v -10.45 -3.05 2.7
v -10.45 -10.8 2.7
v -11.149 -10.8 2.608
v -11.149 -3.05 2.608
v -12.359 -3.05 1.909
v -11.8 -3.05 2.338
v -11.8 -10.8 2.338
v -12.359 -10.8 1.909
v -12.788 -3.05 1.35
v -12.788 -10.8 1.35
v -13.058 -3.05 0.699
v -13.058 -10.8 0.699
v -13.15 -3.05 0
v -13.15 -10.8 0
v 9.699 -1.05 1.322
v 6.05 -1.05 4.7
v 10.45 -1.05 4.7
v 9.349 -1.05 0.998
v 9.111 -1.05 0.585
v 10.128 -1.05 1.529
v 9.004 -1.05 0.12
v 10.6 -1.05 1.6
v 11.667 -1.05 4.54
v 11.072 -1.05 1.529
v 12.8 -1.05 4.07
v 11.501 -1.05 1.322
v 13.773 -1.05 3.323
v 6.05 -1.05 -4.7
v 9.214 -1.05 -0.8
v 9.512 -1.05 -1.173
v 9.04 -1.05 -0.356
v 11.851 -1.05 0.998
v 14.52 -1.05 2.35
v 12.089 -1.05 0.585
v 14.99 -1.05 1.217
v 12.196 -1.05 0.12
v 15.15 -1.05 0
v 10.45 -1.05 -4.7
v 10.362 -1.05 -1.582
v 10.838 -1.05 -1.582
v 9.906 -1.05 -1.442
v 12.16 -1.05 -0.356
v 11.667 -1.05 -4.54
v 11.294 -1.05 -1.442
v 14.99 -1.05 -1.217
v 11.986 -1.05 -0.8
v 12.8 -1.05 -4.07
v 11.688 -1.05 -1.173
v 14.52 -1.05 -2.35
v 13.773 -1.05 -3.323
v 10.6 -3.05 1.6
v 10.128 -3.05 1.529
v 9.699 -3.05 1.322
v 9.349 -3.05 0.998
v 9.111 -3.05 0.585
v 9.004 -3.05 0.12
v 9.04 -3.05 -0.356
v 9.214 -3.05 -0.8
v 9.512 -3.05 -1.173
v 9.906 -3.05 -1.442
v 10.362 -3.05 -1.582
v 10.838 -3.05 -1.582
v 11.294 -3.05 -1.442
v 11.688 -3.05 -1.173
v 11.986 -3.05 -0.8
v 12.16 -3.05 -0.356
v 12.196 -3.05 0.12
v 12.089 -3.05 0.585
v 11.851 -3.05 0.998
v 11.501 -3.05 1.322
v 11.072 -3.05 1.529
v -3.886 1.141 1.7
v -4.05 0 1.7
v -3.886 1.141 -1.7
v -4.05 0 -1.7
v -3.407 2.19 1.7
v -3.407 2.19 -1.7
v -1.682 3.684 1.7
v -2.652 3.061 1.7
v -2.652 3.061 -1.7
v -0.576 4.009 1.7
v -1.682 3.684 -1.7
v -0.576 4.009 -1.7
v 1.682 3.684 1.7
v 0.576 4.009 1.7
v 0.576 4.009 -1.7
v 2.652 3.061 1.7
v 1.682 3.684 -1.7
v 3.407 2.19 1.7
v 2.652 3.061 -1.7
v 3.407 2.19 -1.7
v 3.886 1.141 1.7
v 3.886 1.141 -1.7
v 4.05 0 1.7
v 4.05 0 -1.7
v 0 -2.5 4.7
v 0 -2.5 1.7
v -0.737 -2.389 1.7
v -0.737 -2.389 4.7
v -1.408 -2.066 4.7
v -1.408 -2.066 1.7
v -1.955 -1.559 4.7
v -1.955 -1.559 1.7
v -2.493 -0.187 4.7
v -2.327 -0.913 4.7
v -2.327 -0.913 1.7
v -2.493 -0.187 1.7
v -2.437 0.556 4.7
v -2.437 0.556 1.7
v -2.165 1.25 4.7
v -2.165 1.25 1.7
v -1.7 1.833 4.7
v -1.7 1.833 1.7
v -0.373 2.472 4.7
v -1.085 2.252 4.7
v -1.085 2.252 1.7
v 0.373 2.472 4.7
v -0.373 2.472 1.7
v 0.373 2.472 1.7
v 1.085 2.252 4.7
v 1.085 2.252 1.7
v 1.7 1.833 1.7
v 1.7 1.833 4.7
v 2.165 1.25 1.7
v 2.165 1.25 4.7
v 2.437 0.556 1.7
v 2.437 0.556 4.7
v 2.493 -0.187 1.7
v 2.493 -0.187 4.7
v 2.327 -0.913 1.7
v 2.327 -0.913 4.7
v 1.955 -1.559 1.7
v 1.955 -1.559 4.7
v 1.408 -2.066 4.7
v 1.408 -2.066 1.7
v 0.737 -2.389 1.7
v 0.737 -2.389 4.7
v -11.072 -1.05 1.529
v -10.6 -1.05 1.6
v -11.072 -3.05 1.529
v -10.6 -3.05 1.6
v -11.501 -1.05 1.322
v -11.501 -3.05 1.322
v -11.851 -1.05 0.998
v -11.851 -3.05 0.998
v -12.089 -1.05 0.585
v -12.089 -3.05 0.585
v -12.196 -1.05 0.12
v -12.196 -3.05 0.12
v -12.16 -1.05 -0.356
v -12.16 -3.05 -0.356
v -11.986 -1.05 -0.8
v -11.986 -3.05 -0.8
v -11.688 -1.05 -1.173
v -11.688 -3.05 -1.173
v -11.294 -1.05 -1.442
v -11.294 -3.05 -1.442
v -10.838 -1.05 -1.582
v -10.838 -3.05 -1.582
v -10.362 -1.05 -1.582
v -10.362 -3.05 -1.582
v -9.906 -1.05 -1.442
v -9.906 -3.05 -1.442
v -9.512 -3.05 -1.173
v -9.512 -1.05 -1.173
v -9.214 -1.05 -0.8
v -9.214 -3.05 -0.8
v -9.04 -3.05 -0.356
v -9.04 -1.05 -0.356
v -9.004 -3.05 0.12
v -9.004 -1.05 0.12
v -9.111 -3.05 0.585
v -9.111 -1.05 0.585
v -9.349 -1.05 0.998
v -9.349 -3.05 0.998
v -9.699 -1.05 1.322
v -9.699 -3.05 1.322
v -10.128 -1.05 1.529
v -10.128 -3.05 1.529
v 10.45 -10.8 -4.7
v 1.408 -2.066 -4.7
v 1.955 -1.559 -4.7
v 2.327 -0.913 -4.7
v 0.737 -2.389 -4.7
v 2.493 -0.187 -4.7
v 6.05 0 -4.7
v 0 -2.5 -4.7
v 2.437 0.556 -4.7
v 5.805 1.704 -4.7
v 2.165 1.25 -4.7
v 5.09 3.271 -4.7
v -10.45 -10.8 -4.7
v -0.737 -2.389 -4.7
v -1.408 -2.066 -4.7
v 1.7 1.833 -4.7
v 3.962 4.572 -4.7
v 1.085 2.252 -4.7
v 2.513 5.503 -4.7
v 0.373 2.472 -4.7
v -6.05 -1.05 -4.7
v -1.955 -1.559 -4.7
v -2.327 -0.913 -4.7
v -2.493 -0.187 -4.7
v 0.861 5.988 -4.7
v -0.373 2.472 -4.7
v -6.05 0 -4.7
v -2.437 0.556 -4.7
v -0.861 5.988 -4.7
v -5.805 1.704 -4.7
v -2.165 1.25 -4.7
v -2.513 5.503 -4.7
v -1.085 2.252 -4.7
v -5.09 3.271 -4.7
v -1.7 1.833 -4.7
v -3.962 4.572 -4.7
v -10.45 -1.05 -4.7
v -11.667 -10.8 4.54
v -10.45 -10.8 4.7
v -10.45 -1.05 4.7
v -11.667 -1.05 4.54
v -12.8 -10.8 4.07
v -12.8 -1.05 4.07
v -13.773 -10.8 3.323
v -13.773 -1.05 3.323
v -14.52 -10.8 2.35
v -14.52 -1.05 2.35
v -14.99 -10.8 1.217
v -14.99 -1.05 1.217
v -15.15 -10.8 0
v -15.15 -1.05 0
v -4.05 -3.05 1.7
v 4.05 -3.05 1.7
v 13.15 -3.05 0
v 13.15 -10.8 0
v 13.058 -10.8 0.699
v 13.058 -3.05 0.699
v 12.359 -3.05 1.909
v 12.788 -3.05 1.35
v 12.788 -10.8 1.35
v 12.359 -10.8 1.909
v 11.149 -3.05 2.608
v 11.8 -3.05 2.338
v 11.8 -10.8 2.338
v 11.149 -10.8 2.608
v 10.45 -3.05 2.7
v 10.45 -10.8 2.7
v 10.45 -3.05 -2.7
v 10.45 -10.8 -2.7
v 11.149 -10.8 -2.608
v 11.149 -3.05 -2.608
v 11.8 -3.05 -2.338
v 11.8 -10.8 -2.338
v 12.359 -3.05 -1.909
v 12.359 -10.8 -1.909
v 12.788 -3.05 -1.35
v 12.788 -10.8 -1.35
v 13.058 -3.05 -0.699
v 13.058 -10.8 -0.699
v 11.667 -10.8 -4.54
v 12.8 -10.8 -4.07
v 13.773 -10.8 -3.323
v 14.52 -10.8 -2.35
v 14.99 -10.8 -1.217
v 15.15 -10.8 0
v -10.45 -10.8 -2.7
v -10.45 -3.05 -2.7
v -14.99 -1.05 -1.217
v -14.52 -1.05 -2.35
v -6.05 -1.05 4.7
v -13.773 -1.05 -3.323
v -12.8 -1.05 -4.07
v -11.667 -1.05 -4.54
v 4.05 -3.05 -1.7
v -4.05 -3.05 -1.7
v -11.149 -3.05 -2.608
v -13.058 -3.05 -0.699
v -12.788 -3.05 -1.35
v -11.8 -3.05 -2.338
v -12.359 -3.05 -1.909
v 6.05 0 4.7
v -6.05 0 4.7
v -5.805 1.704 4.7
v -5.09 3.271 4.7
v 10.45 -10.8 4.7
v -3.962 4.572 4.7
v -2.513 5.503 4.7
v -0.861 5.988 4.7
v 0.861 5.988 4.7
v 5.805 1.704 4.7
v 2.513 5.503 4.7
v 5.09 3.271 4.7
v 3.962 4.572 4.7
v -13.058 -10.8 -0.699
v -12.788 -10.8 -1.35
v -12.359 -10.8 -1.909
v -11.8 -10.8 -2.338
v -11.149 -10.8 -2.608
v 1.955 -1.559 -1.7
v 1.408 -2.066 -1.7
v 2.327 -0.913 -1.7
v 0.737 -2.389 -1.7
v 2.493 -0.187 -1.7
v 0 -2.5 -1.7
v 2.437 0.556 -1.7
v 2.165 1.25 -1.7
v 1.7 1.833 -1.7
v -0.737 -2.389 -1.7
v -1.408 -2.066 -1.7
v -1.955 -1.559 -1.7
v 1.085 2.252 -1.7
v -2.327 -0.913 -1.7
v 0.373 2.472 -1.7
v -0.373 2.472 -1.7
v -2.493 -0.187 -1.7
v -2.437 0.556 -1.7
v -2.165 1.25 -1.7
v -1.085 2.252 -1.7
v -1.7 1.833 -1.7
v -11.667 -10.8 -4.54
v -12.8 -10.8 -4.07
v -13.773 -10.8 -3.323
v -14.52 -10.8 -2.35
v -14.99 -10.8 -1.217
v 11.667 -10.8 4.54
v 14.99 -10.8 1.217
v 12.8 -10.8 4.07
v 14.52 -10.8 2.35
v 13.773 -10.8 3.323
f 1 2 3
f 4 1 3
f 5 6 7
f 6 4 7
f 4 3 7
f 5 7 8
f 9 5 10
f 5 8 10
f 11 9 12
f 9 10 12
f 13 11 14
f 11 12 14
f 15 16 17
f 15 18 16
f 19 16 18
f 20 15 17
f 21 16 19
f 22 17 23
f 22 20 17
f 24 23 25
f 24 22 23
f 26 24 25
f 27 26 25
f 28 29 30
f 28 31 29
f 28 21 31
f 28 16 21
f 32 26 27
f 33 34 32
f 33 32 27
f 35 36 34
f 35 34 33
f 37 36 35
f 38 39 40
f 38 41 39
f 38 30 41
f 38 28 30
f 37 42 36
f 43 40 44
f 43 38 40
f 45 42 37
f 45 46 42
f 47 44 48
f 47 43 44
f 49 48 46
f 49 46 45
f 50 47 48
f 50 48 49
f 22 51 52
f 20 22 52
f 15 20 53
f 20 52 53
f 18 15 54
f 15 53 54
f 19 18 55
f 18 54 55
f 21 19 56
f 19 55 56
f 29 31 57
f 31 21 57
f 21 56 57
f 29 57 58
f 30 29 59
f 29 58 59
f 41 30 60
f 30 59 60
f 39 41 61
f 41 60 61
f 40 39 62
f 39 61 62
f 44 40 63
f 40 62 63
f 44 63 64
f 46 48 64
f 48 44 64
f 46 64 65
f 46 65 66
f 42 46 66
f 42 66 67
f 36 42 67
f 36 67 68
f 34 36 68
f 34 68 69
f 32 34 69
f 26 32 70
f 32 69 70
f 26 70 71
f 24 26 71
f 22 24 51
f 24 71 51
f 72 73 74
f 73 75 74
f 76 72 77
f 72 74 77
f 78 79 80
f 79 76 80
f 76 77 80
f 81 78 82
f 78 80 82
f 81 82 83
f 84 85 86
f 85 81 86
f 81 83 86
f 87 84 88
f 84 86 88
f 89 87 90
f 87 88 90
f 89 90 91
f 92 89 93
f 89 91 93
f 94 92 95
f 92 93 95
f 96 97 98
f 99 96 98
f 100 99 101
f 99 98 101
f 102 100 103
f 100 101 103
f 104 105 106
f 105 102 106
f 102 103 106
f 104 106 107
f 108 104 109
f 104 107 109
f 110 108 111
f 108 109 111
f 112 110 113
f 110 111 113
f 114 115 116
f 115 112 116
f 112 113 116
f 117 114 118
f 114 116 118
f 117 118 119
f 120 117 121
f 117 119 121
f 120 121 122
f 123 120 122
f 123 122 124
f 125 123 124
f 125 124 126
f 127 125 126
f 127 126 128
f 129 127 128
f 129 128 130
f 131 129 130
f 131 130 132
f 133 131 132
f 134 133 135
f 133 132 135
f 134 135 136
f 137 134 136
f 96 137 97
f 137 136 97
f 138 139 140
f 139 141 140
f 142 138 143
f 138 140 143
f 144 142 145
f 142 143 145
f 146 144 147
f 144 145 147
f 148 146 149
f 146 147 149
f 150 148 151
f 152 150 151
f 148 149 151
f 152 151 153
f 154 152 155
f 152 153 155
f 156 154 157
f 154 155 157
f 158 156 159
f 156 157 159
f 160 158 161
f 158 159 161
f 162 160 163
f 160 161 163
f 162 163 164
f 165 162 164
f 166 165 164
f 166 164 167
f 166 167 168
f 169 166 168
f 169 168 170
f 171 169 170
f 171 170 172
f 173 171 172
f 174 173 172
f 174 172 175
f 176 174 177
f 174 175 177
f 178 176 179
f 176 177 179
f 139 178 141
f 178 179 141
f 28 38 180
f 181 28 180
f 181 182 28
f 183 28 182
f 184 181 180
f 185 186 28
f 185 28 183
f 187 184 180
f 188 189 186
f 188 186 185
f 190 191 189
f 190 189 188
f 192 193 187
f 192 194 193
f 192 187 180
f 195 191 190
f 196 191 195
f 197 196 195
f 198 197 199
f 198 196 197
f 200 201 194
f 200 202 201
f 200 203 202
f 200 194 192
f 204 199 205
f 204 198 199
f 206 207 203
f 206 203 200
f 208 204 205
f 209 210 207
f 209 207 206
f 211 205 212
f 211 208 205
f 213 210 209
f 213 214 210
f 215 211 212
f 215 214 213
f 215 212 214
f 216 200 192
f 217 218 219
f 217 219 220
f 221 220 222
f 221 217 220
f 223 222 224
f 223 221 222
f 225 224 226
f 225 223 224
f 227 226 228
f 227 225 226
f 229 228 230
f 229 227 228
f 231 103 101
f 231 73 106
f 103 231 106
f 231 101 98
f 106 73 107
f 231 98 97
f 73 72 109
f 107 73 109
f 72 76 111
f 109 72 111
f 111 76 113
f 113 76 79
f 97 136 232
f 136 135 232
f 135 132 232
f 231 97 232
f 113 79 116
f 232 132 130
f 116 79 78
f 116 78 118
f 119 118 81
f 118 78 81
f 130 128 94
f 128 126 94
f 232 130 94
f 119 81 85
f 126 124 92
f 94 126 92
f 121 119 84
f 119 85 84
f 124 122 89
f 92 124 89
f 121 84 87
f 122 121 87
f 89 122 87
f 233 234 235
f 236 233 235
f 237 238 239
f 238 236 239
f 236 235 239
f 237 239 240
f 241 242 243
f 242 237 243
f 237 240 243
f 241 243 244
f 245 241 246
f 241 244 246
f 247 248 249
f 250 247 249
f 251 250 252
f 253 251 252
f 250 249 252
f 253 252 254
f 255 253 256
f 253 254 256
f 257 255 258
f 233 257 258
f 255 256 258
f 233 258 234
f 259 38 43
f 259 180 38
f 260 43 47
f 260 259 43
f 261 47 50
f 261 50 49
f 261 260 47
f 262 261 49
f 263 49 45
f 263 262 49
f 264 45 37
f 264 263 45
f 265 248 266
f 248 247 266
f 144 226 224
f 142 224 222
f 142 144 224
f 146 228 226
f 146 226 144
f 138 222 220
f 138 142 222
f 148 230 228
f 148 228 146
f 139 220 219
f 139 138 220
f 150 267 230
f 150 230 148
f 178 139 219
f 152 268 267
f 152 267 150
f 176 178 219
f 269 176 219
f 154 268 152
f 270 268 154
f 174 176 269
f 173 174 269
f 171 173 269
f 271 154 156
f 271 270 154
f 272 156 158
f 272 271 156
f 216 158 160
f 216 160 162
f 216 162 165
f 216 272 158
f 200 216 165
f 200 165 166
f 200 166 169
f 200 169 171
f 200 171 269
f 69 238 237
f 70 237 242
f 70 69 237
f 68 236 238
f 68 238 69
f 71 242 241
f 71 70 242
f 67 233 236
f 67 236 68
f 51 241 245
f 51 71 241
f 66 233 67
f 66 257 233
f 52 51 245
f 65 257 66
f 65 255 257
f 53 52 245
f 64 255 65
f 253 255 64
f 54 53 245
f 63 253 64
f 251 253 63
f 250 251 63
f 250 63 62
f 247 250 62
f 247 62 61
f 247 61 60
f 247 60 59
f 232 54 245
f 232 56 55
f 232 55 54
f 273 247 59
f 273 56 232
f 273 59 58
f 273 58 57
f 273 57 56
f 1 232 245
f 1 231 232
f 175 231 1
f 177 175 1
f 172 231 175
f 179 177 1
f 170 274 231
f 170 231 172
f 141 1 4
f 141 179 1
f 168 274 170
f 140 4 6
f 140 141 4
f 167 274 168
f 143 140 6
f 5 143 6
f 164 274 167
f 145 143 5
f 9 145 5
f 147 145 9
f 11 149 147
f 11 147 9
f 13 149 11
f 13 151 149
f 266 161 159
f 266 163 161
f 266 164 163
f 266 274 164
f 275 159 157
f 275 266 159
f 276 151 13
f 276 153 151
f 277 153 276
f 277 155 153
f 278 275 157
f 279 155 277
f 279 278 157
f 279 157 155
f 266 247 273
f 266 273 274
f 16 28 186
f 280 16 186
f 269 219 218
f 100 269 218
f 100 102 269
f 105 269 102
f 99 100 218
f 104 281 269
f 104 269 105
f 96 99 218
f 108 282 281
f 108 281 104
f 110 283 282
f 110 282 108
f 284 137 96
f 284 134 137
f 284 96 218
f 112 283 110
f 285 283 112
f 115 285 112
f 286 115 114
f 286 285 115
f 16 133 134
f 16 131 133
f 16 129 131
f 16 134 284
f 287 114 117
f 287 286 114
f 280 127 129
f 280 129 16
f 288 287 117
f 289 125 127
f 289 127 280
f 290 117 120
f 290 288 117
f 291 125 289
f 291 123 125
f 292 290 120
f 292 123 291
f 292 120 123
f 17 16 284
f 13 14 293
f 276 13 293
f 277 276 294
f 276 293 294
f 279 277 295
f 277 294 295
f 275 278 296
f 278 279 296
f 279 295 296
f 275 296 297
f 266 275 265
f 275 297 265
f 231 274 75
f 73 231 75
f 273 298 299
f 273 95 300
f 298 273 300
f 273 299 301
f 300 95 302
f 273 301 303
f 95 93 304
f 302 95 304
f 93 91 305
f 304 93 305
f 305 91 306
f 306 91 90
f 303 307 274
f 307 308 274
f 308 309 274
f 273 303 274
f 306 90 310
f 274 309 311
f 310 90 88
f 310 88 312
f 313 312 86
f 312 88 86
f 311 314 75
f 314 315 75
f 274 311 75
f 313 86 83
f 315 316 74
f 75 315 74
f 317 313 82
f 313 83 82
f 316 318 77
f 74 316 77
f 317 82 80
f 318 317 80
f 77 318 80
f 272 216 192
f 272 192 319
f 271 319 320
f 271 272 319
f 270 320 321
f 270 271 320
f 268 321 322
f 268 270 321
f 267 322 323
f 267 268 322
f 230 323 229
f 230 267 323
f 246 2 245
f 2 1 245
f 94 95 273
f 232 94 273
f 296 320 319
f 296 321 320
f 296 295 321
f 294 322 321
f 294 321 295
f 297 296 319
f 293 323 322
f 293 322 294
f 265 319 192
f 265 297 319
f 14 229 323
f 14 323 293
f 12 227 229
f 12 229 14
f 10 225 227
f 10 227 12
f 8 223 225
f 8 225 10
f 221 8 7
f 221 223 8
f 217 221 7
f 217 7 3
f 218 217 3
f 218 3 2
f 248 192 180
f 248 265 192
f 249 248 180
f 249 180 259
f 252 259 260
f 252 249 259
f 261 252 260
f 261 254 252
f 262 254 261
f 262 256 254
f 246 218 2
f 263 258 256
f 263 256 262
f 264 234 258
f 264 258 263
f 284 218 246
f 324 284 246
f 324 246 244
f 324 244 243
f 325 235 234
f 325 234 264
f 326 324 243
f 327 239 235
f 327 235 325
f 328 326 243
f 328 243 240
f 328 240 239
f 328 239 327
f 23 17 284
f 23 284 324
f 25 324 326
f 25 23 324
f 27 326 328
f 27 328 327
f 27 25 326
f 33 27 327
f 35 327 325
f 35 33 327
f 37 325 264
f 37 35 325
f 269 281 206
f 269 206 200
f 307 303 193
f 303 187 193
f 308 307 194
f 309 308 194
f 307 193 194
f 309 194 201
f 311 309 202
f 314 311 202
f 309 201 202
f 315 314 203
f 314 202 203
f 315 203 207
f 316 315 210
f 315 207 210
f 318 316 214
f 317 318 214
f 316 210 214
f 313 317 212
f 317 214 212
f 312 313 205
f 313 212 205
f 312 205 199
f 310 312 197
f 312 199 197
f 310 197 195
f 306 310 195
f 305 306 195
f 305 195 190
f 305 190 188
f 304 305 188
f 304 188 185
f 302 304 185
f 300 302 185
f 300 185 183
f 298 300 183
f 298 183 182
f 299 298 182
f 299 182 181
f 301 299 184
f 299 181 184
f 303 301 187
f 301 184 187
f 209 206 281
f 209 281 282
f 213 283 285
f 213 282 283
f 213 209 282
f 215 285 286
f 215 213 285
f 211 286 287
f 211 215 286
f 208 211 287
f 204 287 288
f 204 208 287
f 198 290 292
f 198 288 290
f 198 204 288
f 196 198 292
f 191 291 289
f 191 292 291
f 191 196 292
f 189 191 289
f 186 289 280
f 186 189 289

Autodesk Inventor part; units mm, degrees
ref_plane "YZ Plane" through (0, 0, 0) normal (1, 0, 0) x (0, 1, 0)
ref_plane "XZ Plane" through (0, 0, 0) normal (0, 1, 0) x (-1, 0, 0)
ref_plane "XY Plane" through (0, 0, 0) normal (0, 0, 1) x (1, 0, 0)
sketch "Эскиз1" plane through (0, 0, 0) normal (0, 0, 1) x (1, 0, 0)
  circle A0 centre (0, 0) radius 4.05
  line L0 (-6.05, -6.05) -> (6.05, -6.05)
  line L1 (6.05, -6.05) -> (6.05, 6.05)
  line L2 (6.05, 6.05) -> (-6.05, 6.05)
  line L3 (-6.05, 6.05) -> (-6.05, -6.05)
  line L4 (-6.05, -6.05) -> (6.05, 6.05) construction
  line L5 (6.05, -6.05) -> (-6.05, 6.05) construction
  line L6 (0, 4.05) -> (0, 6.05)
  line L7 (-4.05, 0) -> (-6.05, 0)
  line L8 (-15.15, -1.05) -> (0, -1.05)
  line L9 (0, -1.05) -> (0, -3.05)
  line L10 (0, -3.05) -> (-15.15, -3.05)
  line L11 (-15.15, -3.05) -> (-15.15, -1.05)
  line L12 (-4.05, 0) -> (4.05, 0)
  line L13 (4.05, 0) -> (4.05, -3.05)
  line L14 (4.05, -3.05) -> (-4.05, -3.05)
  line L15 (-4.05, -3.05) -> (-4.05, 0)
  line L16 (4.05, -3.05) -> (6.05, -3.05)
  line L17 (6.05, -3.05) -> (6.05, 0)
  line L18 (6.05, 0) -> (4.05, 0)
  line L19 (4.05, 0) -> (4.05, -3.05)
  point P0 (0, -2.05)
  point P1 (0, -6.05)
  point P2 (-6.05, -1.05)
  point P3 (-2.6646, -3.05)
  point P4 (-4.05, -3.05)
  point P5 (2.6646, -3.05)
  point P6 (-6.05, -3.05)
  point P7 (-4.05, -1.05)
  point P8 (-3.9115, -1.05)
  point P9 (-2.6646, -3.05)
  dimension "d0" = 8.1
  dimension "d1" = 2
  dimension "d2" = 2
  dimension "d3" = 9.1
  dimension "d4" = 2
  dimension "d5" = 3
extrude "Выдавливание1" add sketch "Эскиз1" along normal blind 1.7 contours A0 L7 L3 L2 L6 | L15 L8 L3 L7 | L15 L10 L3 L8 | L3 L10 L11 L8
sketch "Эскиз2" plane through (0, 0, 1.7) normal (0, 0, 1) x (1, 0, 0)
  line L0 (-6.05, -1.05) -> (-15.15, -1.05) projected
  line L1 (-15.15, -1.05) -> (-15.15, -3.05) projected
  line L2 (-15.15, -3.05) -> (-4.05, -3.05) projected
  line L3 (-4.05, -3.05) -> (-4.05, 0) projected
  arc A0 (0, 4.05) -> (-4.05, 0) centre (0, 0) ccw projected
  line L4 (0, 4.05) -> (0, 6.05) projected
  line L5 (0, 6.05) -> (-6.05, 6.05) projected
  line L6 (-6.05, 6.05) -> (-6.05, -1.05) projected
  line L7 (0, 4.05) -> (-4.05, 4.05)
  line L8 (-4.05, 4.05) -> (-4.05, -3.05)
  line L9 (-4.05, -3.05) -> (0, -3.05)
  line L10 (0, -3.05) -> (0, 4.05)
extrude "Выдавливание2" add sketch "Эскиз2" along normal blind 3
mirror "Зеркальное отражение1" about plane through (-9.6, -2.05, 0) normal (0, 0, -1)
sketch "Эскиз4" plane through (-15.15, -1.05, 4.7) normal (0, 1, 0) x (1, 0, 0)
  line L0 (0, 9.4) -> (0, 0) projected
  line L1 (0, 4.7) -> (9.1, 4.7)
  line L2 (9.1, 9.4) -> (9.1, 0) projected
  point P0 (15.15, 4.7)
  point P1 (4.55, 4.7)
hole "Отверстие2" at (-10.6, -1.05, 0) direction (0, -1, 0) diameter 3.2 end through all
mirror "Зеркальное отражение2" about plane through (0, 4.05, 0) normal (1, 0, 0)
sketch "Эскиз3" plane through (0, 0, 4.7) normal (0, 0, 1) x (1, 0, 0)
  arc A0 (2.6646, -3.05) -> (4.05, 0) centre (0, 0) ccw projected
  arc A1 (2.6646, -3.05) -> (4.05, 0) centre (0, 0) ccw projected
hole "Отверстие1" at (0, 0, 4.7) direction (0, 0, -1) diameter 5 end through all
fillet "Сопряжение1" radius 6.05 2 edges at (-6.05, 6.05, 0) (6.05, 6.05, 0)
sketch "Эскиз7" plane through (-15.15, -3.05, -4.7) normal (0, -1, 0) x (1, 0, 0)
  line L0 (30.3, 0) -> (0, 0) projected
  line L1 (0, 9.4) -> (30.3, 9.4) projected
  line L2 (12.65, 9.4) -> (17.65, 9.4) projected
  line L3 (15.15, 9.4) -> (15.15, 0)
  line L4 (28.3, 2) -> (2, 2)
  line L5 (2, 2) -> (2, 7.4)
  line L6 (2, 7.4) -> (28.3, 7.4)
  line L7 (28.3, 7.4) -> (28.3, 2)
  line L8 (28.3, 2) -> (2, 7.4) construction
  line L9 (2, 2) -> (28.3, 7.4) construction
  line L10 (0, 9.4) -> (0, 0) projected
  line L11 (30.3, 9.4) -> (30.3, 0) projected
  point P0 (15.15, 4.7)
  dimension "d29" = 2
  dimension "d30" = 2
extrude "Выдавливание4" add sketch "Эскиз7" along normal blind 7.75 contours L0 L3 L4 L7 L6 L1 L11 | L0 L10 L1 L3 L6 L5 L4
fillet "Сопряжение2" radius 4.7 4 edges at (15.15, -5.925, -4.7) (15.15, -5.925, 4.7) (-15.15, -5.925, -4.7) (-15.15, -5.925, 4.7)
fillet "Сопряжение3" radius 2.7 4 edges at (13.15, -6.925, -2.7) (13.15, -6.925, 2.7) (-13.15, -6.925, 2.7) (-13.15, -6.925, -2.7)
properties part number "Крышка стойки подшипника 3мм"
